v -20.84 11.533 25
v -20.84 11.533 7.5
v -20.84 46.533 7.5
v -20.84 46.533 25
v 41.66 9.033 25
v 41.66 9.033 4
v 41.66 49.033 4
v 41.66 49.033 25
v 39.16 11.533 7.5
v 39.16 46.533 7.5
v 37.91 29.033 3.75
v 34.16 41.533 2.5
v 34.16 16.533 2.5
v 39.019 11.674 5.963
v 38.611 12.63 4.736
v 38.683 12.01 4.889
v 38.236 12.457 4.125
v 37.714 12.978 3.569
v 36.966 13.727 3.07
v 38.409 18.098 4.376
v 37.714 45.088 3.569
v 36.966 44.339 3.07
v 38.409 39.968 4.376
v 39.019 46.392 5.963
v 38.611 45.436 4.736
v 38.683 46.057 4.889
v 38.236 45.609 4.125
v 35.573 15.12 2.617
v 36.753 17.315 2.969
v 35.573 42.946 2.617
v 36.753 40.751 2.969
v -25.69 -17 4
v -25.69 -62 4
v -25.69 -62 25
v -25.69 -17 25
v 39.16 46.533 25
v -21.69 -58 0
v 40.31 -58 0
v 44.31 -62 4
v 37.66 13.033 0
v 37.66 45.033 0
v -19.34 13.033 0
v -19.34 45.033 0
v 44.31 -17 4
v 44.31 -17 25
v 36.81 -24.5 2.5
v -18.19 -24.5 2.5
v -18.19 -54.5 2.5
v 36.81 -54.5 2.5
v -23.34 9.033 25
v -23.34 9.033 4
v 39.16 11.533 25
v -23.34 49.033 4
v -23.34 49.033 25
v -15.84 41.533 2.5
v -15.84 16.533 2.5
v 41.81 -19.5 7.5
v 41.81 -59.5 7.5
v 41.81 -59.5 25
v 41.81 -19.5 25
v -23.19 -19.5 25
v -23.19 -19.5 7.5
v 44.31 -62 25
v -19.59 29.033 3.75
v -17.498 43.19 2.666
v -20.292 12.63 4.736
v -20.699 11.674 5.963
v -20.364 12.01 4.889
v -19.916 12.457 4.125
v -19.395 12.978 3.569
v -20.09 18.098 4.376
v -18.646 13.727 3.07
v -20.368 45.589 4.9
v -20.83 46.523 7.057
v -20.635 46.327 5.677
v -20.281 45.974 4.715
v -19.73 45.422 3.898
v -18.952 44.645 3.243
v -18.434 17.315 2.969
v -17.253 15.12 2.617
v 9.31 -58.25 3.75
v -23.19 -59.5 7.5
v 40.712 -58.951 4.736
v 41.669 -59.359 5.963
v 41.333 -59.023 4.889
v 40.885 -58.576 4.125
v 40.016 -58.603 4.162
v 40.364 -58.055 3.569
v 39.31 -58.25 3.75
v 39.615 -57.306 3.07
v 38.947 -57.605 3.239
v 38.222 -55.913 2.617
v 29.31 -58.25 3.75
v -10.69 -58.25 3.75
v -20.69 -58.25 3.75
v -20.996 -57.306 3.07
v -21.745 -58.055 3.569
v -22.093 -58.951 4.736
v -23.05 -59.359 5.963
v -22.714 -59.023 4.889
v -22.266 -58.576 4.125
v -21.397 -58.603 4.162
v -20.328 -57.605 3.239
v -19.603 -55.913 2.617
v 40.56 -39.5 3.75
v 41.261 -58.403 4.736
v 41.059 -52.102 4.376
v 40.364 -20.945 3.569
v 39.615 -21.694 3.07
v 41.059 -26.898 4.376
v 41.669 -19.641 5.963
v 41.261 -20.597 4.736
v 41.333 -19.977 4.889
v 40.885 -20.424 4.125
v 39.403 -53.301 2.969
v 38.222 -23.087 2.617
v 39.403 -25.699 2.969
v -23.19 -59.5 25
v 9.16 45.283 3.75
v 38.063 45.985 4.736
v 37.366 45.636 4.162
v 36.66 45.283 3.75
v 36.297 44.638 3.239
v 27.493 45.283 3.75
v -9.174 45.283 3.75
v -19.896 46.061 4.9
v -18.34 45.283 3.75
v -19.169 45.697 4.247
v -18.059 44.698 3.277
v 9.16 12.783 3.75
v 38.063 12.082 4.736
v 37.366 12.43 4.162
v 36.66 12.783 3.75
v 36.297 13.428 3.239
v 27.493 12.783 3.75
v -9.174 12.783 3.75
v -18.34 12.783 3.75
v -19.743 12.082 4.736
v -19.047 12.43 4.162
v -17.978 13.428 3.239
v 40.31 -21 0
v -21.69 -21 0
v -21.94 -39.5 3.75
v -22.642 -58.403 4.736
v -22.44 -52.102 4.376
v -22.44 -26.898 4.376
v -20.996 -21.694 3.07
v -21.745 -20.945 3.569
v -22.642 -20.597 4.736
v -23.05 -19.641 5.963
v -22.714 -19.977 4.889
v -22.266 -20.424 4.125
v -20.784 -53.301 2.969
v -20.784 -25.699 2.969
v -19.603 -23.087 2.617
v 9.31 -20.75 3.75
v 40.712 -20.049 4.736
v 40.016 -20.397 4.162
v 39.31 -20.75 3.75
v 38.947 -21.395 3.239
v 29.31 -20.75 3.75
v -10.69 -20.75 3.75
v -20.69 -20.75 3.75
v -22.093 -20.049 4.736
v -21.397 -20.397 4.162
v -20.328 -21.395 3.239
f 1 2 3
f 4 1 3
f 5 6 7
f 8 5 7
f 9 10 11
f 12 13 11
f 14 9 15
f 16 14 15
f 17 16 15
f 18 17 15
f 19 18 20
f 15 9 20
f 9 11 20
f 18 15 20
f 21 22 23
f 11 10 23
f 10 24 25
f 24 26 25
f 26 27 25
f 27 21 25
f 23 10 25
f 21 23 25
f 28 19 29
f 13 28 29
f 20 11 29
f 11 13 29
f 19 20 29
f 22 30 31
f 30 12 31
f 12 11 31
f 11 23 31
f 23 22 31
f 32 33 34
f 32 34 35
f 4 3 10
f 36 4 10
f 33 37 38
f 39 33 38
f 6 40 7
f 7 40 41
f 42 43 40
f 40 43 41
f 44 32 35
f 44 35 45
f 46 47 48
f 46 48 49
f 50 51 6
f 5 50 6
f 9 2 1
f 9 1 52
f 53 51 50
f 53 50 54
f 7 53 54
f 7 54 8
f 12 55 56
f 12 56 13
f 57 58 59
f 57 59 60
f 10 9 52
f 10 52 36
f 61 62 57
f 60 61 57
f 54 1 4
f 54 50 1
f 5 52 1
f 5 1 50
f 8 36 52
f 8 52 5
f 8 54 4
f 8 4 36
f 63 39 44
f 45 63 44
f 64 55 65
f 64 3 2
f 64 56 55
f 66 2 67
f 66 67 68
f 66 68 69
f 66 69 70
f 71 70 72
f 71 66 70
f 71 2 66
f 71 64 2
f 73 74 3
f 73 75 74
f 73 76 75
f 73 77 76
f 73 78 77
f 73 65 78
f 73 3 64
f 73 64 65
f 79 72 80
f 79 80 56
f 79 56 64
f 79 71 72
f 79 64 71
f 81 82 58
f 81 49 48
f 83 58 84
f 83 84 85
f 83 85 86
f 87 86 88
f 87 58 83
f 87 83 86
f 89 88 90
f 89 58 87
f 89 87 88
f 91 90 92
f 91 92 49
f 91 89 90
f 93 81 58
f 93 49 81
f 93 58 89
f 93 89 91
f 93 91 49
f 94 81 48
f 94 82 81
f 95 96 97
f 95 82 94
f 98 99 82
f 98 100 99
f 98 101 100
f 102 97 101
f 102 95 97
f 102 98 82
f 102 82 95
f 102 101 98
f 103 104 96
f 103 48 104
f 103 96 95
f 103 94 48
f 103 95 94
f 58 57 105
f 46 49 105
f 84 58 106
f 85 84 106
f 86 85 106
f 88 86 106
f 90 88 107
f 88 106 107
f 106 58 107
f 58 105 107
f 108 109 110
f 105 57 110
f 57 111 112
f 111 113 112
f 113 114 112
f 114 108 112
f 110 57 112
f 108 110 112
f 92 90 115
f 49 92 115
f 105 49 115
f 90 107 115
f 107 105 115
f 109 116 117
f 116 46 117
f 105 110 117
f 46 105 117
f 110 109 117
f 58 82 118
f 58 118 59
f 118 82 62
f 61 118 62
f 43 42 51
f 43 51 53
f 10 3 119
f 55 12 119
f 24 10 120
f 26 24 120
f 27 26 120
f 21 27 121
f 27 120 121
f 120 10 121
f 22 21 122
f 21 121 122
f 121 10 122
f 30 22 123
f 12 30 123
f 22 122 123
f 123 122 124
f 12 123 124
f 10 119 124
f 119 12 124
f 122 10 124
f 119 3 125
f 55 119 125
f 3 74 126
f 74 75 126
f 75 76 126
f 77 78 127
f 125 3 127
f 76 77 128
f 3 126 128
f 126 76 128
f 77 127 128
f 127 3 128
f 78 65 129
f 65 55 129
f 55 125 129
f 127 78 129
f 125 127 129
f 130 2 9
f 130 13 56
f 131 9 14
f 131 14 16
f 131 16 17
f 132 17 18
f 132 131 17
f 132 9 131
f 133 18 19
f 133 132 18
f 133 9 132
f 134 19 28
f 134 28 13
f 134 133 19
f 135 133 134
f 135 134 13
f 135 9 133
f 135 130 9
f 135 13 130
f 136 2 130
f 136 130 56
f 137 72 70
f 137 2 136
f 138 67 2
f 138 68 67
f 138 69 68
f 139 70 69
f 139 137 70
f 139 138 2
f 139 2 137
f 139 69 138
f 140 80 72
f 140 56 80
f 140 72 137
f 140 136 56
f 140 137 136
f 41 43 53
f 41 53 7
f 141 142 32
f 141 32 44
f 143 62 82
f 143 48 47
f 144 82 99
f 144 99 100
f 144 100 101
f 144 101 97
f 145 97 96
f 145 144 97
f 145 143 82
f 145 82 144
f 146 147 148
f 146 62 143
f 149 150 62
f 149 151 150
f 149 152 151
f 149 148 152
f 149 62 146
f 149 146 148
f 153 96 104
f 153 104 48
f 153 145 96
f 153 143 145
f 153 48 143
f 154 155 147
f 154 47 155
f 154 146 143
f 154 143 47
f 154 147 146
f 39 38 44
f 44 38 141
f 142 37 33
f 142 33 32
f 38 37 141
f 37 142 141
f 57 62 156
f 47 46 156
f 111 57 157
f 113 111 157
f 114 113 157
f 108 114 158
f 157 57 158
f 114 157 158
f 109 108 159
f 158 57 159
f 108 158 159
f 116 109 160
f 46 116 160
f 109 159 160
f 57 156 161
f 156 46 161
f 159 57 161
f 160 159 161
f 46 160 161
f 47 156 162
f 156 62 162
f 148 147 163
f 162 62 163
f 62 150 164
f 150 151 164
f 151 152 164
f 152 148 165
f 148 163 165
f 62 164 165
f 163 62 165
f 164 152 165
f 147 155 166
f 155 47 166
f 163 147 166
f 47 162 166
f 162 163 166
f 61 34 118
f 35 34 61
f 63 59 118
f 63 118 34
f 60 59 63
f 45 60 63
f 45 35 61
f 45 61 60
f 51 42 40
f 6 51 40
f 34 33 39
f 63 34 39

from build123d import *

# Parameters (mm, degrees)
F0_W        = 70
F0_H        = 45
F1_DEPTH    = 25
F2_T        = -2.5
F3_T1_DEPTH = 40
F3_T3_DEPTH = 65
F4_SIZE     = 4
F5_W        = 65
F5_H        = 40
F6_DEPTH    = 25
F7_T        = -2.5
F8_T1_DEPTH = 35
F8_T3_DEPTH = 60
F9_SIZE     = 4


# Not quite as in the source:
# - a fillet or chamfer that OpenCascade refuses, or shapes differently, is made with other operations: its cross-section is extruded or revolved along the edge and cut away or added


with BuildPart() as f1:
    # F0 (on Top) → F1 (new body)
    with BuildSketch(Plane.XY):
        with Locations((9.3095207959, -39.4999814034)):
            Rectangle(F0_W, F0_H)
    extrude(amount=F1_DEPTH)

    # F2
    f2_openings = [f1.faces().sort_by_distance(p)[0] for p in [
        (9.309521, -39.499981, 25),
    ]]
    offset(amount=F2_T, openings=f2_openings)

    # F3: fillet of radius 5 on 4 edges, made by hand

    # F3_s2 → F3_t1 (join)
    with BuildSketch(Plane.XZ.offset(19.4999814034)):
        with BuildLine():
            add(Edge.make_bspline(
                [(-23.1904792041, 7.5), (-23.1904792041, 2.5), (-18.1904792041, 2.5)],
                knots=[0, 0, 0, 1, 1, 1], degree=2, weights=[1, 1, 1]))
            Line((-18.1904792041, 2.5), (-23.1904792041, 2.5))
            Line((-23.1904792041, 2.5), (-23.1904792041, 7.5))
        make_face()
        with BuildLine():
            add(Edge.make_bspline(
                [(41.8095207959, 7.5), (41.8095207959, 2.5), (36.8095207959, 2.5)],
                knots=[0, 0, 0, 1, 1, 1], degree=2, weights=[1, 1, 1]))
            Line((36.8095207959, 2.5), (41.8095207959, 2.5))
            Line((41.8095207959, 2.5), (41.8095207959, 7.5))
        make_face()
    extrude(amount=F3_T1_DEPTH)

    # F3_s4 → F3_t3 (join)
    with BuildSketch(Plane.YZ.offset(-23.1904792041)):
        with BuildLine():
            add(Edge.make_bspline(
                [(-19.4999814034, 7.5), (-19.4999814034, 2.5), (-24.4999814034, 2.5)],
                knots=[0, 0, 0, 1, 1, 1], degree=2, weights=[1, 1, 1]))
            Line((-24.4999814034, 2.5), (-19.4999814034, 2.5))
            Line((-19.4999814034, 2.5), (-19.4999814034, 7.5))
        make_face()
        with BuildLine():
            add(Edge.make_bspline(
                [(-59.4999814034, 7.5), (-59.4999814034, 2.5), (-54.4999814034, 2.5)],
                knots=[0, 0, 0, 1, 1, 1], degree=2, weights=[1, 1, 1]))
            Line((-54.4999814034, 2.5), (-59.4999814034, 2.5))
            Line((-59.4999814034, 2.5), (-59.4999814034, 7.5))
        make_face()
    extrude(amount=F3_T3_DEPTH)

    # F4
    f4_edges = [f1.edges().sort_by_distance(p)[0] for p in [
        (9.309521, -61.999981, 0),
        (-25.690479, -39.499981, 0),
        (44.309521, -39.499981, 0),
        (9.309521, -16.999981, 0),
    ]]
    chamfer(f4_edges, length=F4_SIZE)


with BuildPart() as f6:
    # F5 (on Top) → F6 (new body)
    with BuildSketch(Plane.XY):
        with Locations((9.1597282141, 29.0331220999)):
            Rectangle(F5_W, F5_H)
    extrude(amount=F6_DEPTH)

    # F7
    f7_openings = [f6.faces().sort_by_distance(p)[0] for p in [
        (9.159728, 29.033122, 25),
    ]]
    offset(amount=F7_T, openings=f7_openings)

    # F8: fillet of radius 5 on 4 edges, made by hand

    # F8_s2 → F8_t1 (join)
    with BuildSketch(Plane.XZ.offset(-46.5331220999)):
        with BuildLine():
            add(Edge.make_bspline(
                [(-20.8402717859, 7.5), (-20.8402717859, 2.5), (-15.8402717859, 2.5)],
                knots=[0, 0, 0, 1, 1, 1], degree=2, weights=[1, 1, 1]))
            Line((-15.8402717859, 2.5), (-20.8402717859, 2.5))
            Line((-20.8402717859, 2.5), (-20.8402717859, 7.5))
        make_face()
        with BuildLine():
            add(Edge.make_bspline(
                [(39.1597282141, 7.5), (39.1597282141, 2.5), (34.1597282141, 2.5)],
                knots=[0, 0, 0, 1, 1, 1], degree=2, weights=[1, 1, 1]))
            Line((34.1597282141, 2.5), (39.1597282141, 2.5))
            Line((39.1597282141, 2.5), (39.1597282141, 7.5))
        make_face()
    extrude(amount=F8_T1_DEPTH)

    # F8_s4 → F8_t3 (join)
    with BuildSketch(Plane.YZ.offset(-20.8402717859)):
        with BuildLine():
            add(Edge.make_bspline(
                [(11.5331220999, 7.5), (11.5331220999, 2.5), (16.5331220999, 2.5)],
                knots=[0, 0, 0, 1, 1, 1], degree=2, weights=[1, 1, 1]))
            Line((16.5331220999, 2.5), (11.5331220999, 2.5))
            Line((11.5331220999, 2.5), (11.5331220999, 7.5))
        make_face()
        with BuildLine():
            add(Edge.make_bspline(
                [(46.5331220999, 7.5), (46.5331220999, 2.5), (41.5331220999, 2.5)],
                knots=[0, 0, 0, 1, 1, 1], degree=2, weights=[1, 1, 1]))
            Line((41.5331220999, 2.5), (46.5331220999, 2.5))
            Line((46.5331220999, 2.5), (46.5331220999, 7.5))
        make_face()
    extrude(amount=F8_T3_DEPTH)

    # F9
    f9_edges = [f6.edges().sort_by_distance(p)[0] for p in [
        (9.159728, 9.033122, 0),
        (-23.340272, 29.033122, 0),
        (9.159728, 49.033122, 0),
        (41.659728, 29.033122, 0),
    ]]
    chamfer(f9_edges, length=F9_SIZE)


solid = Compound([f1.part, f6.part])
